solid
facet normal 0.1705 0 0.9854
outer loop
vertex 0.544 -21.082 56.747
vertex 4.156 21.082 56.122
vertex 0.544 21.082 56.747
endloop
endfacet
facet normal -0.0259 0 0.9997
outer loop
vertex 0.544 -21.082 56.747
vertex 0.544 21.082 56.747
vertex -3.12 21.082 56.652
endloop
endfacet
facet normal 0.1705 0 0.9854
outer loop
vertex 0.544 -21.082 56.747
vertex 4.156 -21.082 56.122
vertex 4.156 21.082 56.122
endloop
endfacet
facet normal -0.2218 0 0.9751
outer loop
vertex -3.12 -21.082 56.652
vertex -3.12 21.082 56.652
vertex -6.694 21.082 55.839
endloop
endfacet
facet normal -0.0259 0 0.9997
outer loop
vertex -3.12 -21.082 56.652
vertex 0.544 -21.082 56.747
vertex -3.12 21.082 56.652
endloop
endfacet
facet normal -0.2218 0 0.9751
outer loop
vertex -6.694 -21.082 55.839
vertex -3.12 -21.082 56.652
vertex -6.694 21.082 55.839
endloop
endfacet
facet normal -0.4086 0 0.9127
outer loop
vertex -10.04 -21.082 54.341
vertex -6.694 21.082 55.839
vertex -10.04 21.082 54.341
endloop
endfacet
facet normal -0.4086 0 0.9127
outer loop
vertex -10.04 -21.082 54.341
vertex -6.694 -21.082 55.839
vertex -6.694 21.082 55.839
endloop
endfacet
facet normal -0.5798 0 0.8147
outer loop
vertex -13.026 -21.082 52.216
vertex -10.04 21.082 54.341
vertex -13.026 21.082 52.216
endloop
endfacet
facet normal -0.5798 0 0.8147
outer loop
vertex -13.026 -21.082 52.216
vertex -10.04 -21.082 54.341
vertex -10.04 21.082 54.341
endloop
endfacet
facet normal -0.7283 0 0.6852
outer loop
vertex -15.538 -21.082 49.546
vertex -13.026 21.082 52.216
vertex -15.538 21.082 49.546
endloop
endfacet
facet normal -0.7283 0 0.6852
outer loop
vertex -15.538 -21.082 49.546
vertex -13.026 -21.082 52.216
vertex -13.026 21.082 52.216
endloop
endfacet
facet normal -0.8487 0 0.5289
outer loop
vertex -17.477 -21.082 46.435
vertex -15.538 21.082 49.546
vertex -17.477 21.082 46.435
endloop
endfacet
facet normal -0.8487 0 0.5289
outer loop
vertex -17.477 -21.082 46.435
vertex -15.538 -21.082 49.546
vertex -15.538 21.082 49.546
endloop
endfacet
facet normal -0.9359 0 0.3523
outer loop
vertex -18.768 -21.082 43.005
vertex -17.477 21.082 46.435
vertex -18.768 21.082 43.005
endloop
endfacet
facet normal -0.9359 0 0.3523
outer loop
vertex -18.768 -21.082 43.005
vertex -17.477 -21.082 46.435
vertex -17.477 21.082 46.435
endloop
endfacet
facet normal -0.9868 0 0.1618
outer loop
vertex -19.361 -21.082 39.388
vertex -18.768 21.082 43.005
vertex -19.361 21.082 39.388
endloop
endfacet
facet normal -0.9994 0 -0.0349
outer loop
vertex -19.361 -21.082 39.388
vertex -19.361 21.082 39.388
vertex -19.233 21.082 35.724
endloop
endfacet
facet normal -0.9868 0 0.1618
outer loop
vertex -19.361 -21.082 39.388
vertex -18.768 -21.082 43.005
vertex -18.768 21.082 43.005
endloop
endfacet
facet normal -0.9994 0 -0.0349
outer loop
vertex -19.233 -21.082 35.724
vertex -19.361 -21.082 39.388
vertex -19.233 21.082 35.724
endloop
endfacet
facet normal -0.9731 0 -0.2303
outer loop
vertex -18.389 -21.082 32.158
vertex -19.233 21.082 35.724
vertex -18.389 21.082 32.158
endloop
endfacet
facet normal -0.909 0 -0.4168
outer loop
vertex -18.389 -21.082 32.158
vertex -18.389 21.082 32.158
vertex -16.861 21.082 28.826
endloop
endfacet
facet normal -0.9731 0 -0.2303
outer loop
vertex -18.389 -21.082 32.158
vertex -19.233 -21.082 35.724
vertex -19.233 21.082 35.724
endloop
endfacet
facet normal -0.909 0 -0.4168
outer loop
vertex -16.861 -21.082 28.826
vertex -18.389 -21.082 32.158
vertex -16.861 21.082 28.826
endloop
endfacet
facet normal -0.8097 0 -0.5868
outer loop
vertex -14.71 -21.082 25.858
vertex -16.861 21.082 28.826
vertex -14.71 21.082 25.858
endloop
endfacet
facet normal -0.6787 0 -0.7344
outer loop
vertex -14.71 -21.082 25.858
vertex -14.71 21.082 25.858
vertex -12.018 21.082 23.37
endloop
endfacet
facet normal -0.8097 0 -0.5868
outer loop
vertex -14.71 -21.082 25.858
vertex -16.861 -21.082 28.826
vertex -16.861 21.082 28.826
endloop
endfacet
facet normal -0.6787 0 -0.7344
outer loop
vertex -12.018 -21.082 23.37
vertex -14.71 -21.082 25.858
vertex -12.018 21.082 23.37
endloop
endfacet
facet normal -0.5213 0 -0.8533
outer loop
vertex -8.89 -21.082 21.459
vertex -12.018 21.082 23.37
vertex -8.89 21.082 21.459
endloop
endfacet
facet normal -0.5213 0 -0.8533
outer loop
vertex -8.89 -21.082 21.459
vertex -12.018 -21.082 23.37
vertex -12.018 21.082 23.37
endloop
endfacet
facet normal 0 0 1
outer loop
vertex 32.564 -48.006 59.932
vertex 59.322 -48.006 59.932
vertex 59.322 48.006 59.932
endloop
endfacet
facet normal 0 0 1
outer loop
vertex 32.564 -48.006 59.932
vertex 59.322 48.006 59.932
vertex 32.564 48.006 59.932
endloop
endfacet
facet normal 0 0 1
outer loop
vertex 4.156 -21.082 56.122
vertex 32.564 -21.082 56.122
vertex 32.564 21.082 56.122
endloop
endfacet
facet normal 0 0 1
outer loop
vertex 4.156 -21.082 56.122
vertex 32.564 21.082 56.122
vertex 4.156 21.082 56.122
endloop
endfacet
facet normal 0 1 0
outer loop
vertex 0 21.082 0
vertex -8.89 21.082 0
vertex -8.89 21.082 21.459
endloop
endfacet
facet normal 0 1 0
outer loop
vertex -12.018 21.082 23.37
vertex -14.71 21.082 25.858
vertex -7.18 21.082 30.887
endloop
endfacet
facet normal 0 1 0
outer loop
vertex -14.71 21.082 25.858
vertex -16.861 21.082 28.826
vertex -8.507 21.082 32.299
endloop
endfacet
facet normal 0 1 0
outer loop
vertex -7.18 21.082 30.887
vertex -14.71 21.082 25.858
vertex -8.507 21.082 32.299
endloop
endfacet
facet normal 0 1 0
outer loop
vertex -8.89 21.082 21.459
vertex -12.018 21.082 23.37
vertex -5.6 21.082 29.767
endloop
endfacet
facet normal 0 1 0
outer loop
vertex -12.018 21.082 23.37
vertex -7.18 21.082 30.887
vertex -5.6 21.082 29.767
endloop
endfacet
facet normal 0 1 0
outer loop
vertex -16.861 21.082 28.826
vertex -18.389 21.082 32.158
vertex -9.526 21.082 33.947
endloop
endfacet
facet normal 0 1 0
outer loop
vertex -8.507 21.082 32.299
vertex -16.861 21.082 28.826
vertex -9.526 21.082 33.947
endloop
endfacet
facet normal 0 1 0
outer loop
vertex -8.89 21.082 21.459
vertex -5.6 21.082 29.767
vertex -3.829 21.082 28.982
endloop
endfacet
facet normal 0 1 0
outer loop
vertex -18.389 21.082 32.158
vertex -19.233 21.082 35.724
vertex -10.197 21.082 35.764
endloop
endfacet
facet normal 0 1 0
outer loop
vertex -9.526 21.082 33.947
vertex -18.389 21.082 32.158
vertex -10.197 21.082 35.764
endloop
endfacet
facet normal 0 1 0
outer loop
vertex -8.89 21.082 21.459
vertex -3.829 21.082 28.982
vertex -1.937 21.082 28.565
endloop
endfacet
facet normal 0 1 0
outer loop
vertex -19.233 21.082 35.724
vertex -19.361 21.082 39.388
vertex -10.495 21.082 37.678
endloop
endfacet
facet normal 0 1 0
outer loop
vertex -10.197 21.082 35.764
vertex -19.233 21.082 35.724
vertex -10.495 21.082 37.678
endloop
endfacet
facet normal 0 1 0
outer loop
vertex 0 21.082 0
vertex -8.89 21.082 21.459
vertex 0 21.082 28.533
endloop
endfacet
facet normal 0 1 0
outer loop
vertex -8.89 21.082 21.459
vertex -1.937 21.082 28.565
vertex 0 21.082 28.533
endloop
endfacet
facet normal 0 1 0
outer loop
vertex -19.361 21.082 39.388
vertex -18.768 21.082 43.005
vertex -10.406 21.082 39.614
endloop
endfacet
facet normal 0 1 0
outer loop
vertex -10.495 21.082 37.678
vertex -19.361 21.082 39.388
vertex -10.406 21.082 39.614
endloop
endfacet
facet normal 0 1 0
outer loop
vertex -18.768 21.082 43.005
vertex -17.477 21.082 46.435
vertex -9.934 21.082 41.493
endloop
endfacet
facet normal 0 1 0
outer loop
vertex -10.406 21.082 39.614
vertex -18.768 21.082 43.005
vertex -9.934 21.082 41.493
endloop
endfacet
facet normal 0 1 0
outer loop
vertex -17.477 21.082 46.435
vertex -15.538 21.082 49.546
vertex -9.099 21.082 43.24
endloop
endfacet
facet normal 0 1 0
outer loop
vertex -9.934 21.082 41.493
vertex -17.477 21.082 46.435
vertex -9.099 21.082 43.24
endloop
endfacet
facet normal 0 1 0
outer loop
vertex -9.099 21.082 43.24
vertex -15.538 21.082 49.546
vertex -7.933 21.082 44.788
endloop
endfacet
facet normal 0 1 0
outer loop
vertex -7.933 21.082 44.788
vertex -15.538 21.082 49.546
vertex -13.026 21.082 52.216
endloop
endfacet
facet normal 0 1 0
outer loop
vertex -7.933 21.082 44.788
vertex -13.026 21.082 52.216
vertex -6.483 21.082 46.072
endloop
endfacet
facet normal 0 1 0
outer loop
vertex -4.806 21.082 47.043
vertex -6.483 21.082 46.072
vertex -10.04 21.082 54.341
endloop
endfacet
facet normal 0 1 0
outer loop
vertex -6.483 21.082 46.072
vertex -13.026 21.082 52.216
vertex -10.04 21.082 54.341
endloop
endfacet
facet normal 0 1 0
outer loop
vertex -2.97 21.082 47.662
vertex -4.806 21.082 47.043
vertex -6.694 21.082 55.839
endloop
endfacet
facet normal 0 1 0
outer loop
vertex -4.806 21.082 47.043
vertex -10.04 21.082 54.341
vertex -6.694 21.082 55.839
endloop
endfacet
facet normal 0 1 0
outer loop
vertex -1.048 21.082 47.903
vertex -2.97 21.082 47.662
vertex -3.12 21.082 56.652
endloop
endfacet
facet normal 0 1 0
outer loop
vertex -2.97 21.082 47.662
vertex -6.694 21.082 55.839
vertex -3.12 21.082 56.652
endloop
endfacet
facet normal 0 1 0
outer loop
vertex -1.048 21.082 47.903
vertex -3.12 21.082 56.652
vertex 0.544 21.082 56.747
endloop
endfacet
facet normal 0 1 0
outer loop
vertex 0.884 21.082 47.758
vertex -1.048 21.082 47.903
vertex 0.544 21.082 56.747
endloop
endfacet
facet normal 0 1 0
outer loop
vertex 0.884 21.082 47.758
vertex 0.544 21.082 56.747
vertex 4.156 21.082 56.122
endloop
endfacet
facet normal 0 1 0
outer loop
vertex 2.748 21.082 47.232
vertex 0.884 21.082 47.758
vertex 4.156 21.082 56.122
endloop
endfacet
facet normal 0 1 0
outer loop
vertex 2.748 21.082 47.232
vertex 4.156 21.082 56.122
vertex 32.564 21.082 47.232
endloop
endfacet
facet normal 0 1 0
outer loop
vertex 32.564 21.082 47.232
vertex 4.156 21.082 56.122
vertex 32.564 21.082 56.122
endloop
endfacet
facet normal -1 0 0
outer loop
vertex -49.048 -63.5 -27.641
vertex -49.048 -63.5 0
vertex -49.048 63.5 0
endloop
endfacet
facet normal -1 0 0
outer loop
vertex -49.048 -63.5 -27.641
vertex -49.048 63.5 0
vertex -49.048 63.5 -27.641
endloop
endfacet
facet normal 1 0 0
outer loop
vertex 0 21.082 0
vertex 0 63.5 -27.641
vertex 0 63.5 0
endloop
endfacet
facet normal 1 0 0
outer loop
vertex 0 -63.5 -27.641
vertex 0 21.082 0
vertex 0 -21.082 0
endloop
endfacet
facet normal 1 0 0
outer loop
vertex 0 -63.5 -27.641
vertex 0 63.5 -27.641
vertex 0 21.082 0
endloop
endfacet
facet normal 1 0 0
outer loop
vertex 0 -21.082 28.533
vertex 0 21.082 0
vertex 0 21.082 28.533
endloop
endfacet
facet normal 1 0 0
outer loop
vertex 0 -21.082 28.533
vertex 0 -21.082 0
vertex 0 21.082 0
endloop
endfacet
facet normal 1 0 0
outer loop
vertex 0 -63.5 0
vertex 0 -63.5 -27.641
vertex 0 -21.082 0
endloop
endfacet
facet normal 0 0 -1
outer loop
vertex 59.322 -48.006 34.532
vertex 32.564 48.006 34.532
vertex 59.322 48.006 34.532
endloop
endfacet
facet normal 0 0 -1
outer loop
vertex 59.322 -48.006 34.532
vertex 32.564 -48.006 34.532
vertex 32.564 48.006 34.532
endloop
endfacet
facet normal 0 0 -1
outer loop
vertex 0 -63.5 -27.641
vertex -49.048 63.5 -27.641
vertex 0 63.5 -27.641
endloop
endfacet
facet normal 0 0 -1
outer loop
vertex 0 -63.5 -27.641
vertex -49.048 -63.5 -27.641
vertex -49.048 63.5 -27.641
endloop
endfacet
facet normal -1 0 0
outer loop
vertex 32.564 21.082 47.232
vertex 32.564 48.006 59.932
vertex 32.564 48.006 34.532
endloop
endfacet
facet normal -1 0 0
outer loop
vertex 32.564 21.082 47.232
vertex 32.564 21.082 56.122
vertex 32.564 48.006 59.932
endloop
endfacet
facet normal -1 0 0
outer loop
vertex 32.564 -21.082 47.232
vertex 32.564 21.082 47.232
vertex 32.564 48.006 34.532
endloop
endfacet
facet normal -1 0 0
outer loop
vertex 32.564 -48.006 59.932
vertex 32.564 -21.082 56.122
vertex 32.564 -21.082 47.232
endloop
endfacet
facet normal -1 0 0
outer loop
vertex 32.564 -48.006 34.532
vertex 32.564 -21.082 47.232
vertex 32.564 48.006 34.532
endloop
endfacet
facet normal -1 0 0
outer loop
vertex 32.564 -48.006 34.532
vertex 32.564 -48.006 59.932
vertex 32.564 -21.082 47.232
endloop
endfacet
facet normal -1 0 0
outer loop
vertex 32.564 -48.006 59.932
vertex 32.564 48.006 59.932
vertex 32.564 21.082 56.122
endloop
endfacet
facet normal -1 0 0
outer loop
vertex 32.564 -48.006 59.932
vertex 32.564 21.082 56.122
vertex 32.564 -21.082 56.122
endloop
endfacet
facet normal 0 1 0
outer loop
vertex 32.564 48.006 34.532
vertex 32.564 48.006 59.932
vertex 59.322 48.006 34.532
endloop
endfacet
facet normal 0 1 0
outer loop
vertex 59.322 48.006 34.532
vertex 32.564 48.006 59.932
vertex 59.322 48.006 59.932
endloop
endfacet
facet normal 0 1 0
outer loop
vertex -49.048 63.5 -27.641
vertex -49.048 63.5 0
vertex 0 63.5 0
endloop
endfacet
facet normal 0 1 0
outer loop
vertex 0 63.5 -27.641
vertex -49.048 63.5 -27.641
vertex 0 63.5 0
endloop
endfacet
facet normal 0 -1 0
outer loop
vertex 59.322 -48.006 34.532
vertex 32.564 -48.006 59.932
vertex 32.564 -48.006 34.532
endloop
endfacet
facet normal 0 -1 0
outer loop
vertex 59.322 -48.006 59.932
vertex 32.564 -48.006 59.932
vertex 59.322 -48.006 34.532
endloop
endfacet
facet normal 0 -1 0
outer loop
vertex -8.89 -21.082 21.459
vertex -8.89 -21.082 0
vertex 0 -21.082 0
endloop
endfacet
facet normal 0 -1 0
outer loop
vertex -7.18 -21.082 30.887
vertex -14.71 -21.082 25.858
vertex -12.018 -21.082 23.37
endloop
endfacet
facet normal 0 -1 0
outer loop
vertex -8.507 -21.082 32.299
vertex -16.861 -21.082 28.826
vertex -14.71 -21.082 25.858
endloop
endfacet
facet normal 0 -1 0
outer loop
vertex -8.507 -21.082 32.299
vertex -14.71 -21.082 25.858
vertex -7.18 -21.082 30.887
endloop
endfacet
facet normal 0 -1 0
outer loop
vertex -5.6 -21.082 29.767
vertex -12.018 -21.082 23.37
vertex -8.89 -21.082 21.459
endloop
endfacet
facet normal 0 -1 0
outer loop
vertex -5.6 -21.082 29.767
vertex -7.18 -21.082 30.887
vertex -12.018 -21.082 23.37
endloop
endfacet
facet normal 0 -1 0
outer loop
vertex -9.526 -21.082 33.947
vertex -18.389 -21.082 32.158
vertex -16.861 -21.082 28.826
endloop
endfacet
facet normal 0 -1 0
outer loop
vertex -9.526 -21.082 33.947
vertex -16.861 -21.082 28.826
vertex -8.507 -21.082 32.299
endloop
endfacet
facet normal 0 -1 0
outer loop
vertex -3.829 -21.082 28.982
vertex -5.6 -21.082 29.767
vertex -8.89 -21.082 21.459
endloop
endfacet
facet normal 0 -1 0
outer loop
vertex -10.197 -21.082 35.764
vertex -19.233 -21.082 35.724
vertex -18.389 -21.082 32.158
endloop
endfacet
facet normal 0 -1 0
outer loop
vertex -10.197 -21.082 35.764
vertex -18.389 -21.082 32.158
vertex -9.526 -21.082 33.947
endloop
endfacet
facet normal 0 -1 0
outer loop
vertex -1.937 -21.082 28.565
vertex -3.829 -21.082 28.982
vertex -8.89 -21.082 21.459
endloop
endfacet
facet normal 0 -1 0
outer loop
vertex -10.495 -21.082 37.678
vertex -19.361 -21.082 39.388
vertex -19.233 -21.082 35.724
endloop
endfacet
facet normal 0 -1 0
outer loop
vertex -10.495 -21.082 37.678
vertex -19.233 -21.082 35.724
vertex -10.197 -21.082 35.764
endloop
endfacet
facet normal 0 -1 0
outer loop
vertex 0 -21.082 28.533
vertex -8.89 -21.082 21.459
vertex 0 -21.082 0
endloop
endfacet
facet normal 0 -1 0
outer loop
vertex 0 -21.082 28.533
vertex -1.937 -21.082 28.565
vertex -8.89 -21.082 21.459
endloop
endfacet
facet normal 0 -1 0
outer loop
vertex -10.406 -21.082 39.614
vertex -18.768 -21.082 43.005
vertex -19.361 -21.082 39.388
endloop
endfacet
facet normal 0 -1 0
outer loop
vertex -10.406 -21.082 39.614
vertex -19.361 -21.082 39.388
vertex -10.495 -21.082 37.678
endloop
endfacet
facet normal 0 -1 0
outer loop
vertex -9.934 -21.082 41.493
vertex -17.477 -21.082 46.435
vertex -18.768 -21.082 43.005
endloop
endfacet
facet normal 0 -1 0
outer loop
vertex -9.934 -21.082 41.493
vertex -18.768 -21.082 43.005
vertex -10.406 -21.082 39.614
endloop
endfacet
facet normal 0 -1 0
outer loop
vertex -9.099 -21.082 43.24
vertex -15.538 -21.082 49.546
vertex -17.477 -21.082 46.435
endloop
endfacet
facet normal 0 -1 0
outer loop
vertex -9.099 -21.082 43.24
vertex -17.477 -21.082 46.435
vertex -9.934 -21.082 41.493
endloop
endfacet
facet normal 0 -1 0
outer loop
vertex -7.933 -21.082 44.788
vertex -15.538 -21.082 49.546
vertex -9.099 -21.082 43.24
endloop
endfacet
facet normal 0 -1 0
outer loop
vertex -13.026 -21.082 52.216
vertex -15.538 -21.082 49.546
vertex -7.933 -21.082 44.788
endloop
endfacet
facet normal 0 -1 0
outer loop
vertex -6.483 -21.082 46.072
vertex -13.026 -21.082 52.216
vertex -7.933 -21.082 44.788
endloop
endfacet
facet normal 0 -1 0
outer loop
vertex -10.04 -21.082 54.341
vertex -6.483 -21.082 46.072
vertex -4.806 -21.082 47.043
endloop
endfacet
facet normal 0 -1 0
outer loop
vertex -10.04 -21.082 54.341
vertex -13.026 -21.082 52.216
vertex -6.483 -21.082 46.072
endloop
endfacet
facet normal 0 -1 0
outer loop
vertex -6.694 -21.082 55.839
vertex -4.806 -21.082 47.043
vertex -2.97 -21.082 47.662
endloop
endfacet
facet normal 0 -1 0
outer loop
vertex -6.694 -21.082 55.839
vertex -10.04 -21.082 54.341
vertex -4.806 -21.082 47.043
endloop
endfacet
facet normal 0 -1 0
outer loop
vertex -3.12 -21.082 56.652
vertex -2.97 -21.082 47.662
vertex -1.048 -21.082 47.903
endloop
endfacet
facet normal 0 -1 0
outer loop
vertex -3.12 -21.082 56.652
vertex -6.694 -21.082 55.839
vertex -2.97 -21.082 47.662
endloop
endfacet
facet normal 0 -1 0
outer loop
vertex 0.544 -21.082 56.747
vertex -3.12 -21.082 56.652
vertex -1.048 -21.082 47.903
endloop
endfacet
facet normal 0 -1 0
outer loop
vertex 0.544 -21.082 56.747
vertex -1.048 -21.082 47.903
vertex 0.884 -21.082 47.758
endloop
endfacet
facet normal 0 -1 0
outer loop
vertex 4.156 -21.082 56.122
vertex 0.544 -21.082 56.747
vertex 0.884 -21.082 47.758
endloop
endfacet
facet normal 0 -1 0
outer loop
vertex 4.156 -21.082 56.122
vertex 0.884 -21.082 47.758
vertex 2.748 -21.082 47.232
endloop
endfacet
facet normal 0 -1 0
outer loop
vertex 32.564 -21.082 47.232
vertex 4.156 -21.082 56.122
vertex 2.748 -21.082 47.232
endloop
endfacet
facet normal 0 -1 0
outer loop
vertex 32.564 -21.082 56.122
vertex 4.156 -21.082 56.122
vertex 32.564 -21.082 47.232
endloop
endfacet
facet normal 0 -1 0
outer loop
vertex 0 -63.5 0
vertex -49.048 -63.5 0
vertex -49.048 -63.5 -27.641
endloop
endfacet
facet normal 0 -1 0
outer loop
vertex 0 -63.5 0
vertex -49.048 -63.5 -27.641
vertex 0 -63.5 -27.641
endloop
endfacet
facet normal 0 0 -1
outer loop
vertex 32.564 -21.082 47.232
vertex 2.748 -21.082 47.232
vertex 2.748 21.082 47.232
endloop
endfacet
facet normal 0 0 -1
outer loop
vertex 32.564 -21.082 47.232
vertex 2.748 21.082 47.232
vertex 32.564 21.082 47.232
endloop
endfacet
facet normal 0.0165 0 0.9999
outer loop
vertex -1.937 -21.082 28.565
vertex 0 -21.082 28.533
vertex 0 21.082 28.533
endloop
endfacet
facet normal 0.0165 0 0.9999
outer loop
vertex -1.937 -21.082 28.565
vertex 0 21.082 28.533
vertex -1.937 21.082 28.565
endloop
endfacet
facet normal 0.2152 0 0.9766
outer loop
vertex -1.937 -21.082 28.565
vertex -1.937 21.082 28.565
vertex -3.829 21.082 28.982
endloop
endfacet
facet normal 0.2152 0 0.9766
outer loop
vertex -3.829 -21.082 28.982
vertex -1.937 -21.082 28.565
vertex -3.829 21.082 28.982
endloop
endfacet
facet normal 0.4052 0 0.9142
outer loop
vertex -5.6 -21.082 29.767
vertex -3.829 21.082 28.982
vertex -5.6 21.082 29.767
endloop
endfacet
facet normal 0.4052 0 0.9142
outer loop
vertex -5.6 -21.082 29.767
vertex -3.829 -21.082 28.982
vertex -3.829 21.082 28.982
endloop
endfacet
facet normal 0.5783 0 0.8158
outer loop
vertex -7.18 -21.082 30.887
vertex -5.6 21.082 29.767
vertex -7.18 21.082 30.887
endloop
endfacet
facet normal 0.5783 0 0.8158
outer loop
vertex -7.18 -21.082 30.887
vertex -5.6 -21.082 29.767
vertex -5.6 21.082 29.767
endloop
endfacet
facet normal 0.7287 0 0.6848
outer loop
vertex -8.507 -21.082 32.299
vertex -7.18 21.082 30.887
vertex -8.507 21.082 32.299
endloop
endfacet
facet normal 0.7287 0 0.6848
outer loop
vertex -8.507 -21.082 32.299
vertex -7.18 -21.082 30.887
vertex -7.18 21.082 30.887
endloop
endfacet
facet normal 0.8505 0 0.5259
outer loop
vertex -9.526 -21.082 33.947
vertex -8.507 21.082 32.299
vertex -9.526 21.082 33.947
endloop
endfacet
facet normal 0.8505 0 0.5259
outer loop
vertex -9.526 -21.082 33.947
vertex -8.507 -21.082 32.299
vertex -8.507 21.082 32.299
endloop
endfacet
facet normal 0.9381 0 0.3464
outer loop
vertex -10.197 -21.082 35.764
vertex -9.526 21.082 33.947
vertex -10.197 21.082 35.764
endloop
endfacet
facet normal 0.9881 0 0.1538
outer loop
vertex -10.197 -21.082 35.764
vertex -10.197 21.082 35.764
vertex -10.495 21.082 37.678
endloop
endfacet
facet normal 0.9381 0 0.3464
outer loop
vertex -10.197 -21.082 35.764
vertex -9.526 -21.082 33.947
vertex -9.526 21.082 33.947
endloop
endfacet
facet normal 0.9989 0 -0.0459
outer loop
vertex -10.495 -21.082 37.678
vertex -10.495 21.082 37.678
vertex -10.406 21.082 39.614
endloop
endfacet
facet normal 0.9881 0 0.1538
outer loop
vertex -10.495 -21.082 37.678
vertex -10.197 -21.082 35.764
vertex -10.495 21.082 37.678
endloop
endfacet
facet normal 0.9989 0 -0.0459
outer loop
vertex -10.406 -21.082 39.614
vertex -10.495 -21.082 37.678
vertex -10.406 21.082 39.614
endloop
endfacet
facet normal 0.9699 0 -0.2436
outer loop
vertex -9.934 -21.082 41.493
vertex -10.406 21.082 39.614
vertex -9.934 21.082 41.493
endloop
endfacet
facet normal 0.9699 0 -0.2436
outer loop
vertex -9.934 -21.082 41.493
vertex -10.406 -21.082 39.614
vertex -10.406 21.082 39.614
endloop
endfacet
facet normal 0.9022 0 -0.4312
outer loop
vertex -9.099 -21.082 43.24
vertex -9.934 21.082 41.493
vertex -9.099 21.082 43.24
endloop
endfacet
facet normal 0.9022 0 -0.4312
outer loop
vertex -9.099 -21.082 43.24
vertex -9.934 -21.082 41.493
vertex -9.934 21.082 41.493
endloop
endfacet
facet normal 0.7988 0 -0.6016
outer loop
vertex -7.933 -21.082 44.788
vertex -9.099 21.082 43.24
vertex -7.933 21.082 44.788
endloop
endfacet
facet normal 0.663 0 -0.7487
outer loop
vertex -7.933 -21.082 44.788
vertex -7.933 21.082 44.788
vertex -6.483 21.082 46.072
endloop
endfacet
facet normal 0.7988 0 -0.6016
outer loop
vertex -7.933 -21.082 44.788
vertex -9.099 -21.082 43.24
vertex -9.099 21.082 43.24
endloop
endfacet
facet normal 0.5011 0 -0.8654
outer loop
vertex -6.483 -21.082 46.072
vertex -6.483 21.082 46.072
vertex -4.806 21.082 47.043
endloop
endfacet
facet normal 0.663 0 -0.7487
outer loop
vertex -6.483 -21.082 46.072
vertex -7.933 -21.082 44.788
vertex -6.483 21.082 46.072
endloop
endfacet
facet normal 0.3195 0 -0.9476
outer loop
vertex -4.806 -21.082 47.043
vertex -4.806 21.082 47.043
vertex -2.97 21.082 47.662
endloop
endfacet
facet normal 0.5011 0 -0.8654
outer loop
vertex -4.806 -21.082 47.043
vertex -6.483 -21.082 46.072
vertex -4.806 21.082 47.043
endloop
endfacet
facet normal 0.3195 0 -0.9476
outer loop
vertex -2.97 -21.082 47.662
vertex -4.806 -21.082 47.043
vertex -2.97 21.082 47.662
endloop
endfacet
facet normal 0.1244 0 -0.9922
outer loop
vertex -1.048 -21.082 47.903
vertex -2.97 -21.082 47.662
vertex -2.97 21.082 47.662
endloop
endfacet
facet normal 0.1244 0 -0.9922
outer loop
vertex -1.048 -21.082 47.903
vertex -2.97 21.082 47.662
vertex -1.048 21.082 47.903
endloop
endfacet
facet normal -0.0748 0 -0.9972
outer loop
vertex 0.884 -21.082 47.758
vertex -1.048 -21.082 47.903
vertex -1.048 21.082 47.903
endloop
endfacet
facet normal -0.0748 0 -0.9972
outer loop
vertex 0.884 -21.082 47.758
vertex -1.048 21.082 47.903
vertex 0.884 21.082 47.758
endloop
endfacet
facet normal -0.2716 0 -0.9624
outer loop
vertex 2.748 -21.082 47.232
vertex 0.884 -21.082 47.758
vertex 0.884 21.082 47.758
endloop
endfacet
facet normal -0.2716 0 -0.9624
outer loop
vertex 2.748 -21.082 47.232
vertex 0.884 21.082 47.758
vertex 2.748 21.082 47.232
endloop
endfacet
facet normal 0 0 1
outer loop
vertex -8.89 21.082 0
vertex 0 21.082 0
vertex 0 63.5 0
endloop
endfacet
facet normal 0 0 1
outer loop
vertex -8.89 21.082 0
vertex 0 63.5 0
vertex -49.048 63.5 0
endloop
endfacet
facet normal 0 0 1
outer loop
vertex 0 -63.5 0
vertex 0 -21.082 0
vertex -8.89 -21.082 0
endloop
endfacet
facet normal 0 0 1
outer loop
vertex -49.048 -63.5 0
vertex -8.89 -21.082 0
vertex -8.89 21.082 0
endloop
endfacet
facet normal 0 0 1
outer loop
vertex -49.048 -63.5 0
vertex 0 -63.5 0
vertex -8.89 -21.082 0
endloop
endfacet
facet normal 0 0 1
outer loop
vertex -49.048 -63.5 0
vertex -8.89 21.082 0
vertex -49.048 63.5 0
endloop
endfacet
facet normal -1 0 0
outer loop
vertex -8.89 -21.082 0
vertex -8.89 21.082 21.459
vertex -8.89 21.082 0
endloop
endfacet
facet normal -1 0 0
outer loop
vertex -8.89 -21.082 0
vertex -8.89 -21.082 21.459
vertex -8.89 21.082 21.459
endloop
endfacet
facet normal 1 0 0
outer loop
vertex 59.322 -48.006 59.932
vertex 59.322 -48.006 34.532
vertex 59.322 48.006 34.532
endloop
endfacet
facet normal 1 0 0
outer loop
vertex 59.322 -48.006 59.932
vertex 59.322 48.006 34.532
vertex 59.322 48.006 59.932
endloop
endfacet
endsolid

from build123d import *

# Parameters (mm, degrees)
F1_DEPTH = 63.5
F2_DEPTH = 21.082
F3_DEPTH = 48.006


# Not quite as in the source:
# - a feature of the source that left no trace in its solid (it failed there, or was rolled back) is left out


with BuildPart() as f1:
    # F0 (on Front) → F1 (new body, symmetric)
    with BuildSketch(Plane.XZ):
        Polygon((0, -27.6409685612), (0, 0), (-8.890000172, 0), (-49.0482896566, 0), (-49.0482896566, -27.6409685612), align=None)
    extrude(amount=F1_DEPTH, both=True)

    # F0 (on Front) → F2 (join, symmetric)
    with BuildSketch(Plane.XZ):
        with BuildLine():
            Line((-8.890000172, 0), (0, 0))
            Line((0, 0), (0, 28.5326149315))
            ThreePointArc((0, 28.5326149315), (-10.4057051367, 39.6136101279), (2.7482079064, 47.2321221605))
            Line((2.7482079064, 47.2321221605), (32.5638093054, 47.2321221605))
            Line((32.5638093054, 47.2321221605), (32.5638093054, 56.1221223325))
            Line((32.5638093054, 56.1221223325), (4.1557957579, 56.1221223325))
            ThreePointArc((4.1557957579, 56.1221223325), (-18.2071887125, 44.7519974591), (-8.890000172, 21.4588050682))
            Line((-8.890000172, 21.4588050682), (-8.890000172, 0))
        make_face()
    extrude(amount=F2_DEPTH, both=True)

    # F0 (on Front) → F3 (join, symmetric)
    with BuildSketch(Plane.XZ):
        Polygon((32.5638093054, 56.1221223325), (32.5638093054, 47.2321221605), (32.5638093054, 34.5321221605), (59.3218803406, 34.5321221605), (59.3218803406, 59.9321221605), (32.5638093054, 59.9321221605), align=None)
    extrude(amount=F3_DEPTH, both=True)


solid = f1.part
